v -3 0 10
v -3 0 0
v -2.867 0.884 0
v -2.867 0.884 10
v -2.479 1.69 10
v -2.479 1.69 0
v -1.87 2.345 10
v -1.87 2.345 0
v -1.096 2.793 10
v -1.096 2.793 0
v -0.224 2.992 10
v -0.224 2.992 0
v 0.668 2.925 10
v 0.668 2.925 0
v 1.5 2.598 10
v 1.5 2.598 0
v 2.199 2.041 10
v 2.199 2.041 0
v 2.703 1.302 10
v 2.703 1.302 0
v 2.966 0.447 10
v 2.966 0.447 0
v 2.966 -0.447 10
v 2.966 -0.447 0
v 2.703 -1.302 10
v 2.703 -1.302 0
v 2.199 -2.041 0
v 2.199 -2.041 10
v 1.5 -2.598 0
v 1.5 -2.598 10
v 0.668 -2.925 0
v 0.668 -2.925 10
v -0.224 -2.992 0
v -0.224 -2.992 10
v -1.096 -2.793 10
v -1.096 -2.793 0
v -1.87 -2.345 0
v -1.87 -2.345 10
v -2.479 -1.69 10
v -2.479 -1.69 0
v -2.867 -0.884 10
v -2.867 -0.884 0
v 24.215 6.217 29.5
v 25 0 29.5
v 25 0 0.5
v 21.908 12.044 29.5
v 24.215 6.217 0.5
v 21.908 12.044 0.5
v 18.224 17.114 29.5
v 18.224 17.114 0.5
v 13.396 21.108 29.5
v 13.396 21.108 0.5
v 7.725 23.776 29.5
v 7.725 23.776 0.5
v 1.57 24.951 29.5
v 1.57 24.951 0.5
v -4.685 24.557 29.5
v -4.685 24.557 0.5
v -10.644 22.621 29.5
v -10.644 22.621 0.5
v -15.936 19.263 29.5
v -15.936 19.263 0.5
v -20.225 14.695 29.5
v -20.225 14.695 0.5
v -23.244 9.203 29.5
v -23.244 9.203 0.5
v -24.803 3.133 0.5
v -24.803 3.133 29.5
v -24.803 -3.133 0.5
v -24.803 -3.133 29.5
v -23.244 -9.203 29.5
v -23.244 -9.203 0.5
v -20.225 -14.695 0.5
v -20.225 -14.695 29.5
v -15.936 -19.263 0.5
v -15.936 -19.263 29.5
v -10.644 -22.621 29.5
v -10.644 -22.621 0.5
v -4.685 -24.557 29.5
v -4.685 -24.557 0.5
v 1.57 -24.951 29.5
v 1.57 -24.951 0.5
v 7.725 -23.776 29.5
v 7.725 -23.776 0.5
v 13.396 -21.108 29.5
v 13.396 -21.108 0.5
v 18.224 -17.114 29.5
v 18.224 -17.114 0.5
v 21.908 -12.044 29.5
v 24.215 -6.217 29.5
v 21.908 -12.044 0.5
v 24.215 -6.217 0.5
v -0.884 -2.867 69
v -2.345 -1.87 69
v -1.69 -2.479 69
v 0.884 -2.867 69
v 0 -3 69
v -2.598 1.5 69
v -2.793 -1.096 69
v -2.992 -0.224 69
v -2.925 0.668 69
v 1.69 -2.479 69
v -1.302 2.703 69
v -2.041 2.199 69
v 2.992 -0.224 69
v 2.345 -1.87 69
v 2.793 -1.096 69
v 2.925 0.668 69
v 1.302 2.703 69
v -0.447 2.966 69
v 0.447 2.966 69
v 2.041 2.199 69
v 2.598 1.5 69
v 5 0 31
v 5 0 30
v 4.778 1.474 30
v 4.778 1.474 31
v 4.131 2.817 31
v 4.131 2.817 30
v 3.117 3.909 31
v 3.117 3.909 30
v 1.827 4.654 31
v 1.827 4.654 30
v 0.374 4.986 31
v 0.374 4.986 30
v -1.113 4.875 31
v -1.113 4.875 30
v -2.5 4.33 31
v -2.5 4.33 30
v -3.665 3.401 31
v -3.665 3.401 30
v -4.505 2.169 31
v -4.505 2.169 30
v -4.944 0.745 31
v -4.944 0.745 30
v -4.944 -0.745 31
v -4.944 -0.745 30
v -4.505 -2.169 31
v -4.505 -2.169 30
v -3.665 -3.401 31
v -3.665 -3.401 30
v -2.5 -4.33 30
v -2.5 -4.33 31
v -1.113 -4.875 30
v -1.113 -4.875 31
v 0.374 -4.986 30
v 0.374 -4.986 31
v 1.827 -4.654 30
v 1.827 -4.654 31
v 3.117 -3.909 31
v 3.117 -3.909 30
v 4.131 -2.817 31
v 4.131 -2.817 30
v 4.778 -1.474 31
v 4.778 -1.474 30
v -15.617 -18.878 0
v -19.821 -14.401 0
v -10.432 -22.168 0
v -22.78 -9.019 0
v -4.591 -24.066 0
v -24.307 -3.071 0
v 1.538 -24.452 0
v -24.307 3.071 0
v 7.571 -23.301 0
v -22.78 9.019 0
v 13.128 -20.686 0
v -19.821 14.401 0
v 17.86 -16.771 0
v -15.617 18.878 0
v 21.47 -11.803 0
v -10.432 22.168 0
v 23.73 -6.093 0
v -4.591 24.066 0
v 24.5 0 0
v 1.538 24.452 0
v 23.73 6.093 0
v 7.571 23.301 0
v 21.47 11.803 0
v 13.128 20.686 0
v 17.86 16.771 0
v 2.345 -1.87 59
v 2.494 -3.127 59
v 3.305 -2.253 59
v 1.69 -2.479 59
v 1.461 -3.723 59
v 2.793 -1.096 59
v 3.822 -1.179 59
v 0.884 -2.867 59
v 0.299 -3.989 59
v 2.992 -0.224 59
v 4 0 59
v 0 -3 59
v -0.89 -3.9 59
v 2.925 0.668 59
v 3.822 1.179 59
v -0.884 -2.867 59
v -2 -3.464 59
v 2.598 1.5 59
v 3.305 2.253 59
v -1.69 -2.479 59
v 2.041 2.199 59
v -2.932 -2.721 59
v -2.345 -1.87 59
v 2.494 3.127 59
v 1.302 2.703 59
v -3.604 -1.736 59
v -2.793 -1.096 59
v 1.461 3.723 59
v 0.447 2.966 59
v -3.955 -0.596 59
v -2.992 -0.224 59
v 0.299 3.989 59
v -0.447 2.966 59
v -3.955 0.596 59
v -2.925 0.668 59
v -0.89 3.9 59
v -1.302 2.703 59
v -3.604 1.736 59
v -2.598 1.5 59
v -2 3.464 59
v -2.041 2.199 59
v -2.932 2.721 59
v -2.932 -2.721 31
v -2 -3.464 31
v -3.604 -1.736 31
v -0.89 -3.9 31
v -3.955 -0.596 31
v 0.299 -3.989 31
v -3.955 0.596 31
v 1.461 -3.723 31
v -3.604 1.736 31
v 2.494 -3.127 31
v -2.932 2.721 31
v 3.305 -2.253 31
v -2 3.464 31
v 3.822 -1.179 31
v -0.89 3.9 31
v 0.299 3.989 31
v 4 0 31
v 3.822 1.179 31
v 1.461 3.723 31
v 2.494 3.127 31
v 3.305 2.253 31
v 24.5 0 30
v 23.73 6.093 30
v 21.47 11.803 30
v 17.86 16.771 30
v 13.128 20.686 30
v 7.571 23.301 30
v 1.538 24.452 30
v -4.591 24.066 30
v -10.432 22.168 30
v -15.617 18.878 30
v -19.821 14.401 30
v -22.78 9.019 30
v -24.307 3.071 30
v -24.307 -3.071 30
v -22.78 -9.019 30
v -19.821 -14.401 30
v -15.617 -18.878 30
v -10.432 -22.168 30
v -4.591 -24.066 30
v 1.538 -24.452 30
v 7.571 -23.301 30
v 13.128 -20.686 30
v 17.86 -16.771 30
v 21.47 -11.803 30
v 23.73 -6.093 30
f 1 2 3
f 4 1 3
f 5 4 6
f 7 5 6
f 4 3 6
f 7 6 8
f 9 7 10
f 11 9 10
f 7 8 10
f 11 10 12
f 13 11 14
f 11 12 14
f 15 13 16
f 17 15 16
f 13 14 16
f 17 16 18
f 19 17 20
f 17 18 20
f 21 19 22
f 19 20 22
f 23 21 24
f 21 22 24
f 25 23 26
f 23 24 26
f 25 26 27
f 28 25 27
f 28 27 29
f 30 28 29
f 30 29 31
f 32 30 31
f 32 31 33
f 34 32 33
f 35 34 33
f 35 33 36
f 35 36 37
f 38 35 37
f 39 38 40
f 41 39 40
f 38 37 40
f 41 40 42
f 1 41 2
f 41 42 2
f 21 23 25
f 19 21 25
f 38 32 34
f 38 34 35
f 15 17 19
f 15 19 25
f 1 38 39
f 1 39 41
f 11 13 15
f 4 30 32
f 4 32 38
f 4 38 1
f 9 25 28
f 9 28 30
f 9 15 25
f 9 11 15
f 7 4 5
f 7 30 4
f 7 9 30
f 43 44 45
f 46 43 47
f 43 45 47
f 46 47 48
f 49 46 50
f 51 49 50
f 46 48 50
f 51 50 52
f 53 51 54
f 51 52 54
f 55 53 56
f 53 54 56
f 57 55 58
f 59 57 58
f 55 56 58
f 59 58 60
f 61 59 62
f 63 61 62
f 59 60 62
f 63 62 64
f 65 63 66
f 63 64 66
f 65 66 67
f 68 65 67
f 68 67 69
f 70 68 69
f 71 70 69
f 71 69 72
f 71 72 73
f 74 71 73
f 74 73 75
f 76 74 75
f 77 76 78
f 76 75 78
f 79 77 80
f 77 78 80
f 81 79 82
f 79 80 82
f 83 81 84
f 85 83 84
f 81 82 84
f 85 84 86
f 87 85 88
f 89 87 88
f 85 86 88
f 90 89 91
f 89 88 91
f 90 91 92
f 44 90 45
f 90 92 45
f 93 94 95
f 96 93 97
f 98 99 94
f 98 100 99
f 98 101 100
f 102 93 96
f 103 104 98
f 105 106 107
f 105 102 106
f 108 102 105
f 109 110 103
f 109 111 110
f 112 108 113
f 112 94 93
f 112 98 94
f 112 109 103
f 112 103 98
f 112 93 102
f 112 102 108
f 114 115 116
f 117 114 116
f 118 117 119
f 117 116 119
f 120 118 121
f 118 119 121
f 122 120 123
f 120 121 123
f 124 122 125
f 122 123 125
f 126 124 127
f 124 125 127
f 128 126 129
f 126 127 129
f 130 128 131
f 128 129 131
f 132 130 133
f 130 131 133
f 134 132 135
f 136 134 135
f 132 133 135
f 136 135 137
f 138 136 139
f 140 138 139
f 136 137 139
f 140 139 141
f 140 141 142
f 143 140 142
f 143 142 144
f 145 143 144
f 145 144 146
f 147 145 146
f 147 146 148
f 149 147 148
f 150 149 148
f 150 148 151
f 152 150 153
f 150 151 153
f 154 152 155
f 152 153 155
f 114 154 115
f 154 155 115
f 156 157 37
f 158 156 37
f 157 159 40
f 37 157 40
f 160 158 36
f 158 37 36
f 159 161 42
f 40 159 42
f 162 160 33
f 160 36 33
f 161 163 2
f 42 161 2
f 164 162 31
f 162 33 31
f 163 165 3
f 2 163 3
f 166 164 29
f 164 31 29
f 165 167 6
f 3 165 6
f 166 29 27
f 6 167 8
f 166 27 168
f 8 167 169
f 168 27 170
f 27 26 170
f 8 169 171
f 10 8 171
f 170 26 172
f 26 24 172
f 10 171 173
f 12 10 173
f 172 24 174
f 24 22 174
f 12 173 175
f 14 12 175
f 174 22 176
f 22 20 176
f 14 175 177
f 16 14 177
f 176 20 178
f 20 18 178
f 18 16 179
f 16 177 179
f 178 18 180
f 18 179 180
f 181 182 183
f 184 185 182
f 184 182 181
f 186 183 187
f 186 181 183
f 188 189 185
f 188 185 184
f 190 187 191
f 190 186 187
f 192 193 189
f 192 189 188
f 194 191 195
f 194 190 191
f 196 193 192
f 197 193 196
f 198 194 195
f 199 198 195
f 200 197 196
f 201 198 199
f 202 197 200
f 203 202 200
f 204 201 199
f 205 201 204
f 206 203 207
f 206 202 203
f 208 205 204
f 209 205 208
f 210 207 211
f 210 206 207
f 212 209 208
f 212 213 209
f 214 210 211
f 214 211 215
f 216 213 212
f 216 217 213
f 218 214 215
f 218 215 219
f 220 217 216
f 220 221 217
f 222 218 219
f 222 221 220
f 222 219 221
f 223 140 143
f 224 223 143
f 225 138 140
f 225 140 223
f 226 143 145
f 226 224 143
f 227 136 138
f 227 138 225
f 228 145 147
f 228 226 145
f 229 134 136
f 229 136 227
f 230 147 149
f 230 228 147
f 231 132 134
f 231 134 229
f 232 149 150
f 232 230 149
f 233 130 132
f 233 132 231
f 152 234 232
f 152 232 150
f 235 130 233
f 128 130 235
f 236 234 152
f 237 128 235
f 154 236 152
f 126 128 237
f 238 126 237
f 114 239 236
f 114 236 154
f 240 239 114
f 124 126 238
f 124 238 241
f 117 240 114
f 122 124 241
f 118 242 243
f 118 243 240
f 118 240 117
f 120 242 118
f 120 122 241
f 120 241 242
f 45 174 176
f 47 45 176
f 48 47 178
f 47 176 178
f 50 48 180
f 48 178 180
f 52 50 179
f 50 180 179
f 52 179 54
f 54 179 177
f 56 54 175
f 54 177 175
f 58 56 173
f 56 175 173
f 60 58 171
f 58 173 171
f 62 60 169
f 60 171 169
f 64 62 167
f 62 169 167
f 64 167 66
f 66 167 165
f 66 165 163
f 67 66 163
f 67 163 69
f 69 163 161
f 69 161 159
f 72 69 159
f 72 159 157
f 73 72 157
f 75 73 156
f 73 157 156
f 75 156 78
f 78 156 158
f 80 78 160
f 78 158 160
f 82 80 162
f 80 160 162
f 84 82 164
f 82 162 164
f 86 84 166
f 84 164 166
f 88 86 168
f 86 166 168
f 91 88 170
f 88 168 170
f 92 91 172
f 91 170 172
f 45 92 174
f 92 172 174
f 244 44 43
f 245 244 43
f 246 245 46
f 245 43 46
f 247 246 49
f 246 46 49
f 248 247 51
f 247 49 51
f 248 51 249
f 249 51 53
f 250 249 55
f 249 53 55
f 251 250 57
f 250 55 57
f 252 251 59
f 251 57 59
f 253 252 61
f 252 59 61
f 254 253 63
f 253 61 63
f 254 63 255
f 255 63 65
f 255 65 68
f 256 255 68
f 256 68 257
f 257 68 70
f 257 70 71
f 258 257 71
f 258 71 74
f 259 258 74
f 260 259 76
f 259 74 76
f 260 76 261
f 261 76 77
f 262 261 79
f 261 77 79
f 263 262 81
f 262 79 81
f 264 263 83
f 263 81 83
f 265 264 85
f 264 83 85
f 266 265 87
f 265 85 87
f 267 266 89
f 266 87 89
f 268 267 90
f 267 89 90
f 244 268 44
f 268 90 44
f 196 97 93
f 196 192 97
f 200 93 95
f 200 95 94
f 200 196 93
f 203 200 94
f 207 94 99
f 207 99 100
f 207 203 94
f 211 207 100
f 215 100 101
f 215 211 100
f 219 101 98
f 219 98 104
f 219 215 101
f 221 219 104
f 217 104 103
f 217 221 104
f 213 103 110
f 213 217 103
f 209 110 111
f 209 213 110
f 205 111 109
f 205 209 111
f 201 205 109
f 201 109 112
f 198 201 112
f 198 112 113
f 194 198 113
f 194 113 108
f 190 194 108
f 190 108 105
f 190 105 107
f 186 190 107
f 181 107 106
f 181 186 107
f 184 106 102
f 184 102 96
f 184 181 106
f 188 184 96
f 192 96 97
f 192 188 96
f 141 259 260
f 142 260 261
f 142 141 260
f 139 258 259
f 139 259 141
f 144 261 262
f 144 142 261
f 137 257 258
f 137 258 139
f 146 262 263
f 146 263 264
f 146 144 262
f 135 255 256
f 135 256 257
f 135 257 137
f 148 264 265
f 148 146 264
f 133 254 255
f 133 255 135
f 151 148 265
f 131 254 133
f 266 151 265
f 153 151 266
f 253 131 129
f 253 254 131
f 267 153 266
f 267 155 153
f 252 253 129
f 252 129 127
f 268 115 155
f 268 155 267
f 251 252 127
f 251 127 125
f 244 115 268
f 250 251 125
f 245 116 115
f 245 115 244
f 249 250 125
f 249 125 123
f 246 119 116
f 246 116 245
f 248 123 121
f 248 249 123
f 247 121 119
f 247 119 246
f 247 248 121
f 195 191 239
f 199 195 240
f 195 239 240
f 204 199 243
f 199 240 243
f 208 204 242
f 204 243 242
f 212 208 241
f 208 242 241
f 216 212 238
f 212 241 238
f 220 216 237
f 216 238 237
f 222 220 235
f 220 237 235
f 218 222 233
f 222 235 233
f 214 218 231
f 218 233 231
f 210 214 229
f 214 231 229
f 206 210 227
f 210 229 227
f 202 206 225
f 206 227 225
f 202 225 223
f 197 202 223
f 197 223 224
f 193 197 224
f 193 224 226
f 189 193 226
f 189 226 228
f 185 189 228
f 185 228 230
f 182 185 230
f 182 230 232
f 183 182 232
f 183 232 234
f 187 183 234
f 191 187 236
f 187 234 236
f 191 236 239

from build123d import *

# Parameters (mm, degrees)
ESQUISSE1_R             = 25
BOSS_EXTRU_1_DEPTH      = 30
ESQUISSE2_R             = 4
BOSS_EXTRU_2_DEPTH      = 39
ESQUISSE3_R             = 5
BOSS_EXTRU_3_DEPTH      = 1
ESQUISSE4_R             = 3
ENL_V_MAT_EXTRU_1_DEPTH = 10
CHANFREIN1_SIZE         = 0.5
ESQUISSE5_W             = 10
ESQUISSE5_H             = 1


with BuildPart() as part:
    # Esquisse1 → Boss.-Extru.1 (new body)
    with BuildSketch(Plane.XY):
        Circle(ESQUISSE1_R)
    extrude(amount=BOSS_EXTRU_1_DEPTH)

    # Esquisse2 → Boss.-Extru.2 (add)
    with BuildSketch(Plane.XY.offset(30)):
        Circle(ESQUISSE2_R)
    extrude(amount=BOSS_EXTRU_2_DEPTH)

    # Esquisse3 → Boss.-Extru.3 (add)
    with BuildSketch(Plane.XY.offset(30)):
        Circle(ESQUISSE3_R)
    extrude(amount=BOSS_EXTRU_3_DEPTH)

    # Esquisse4 → Enlèv. mat.-Extru.1 (cut)
    with BuildSketch(Plane(origin=(0, 0, 0), x_dir=(-1, 0, 0), z_dir=(0, 0, -1))):
        Circle(ESQUISSE4_R)
    extrude(amount=-ENL_V_MAT_EXTRU_1_DEPTH, mode=Mode.SUBTRACT)

    # Chanfrein1
    chanfrein1_edges = [part.edges().sort_by_distance(p)[0] for p in [
        (-25, 0, 0),
        (-25, 0, 30),
        (-4, 0, 69),
    ]]
    chamfer(chanfrein1_edges, length=CHANFREIN1_SIZE)

    # Esquisse5 → Enlèvement de matière-Révolution1 (revolve, cut)
    with BuildSketch(Plane(origin=(0, 0, 0), x_dir=(0, 0, -1), z_dir=(1, 0, 0)), mode=Mode.PRIVATE) as enl_vement_de_mati_re_r_volution1_sk:
        with Locations((-64, 3.5)):
            Rectangle(ESQUISSE5_W, ESQUISSE5_H)
    revolve(enl_vement_de_mati_re_r_volution1_sk.sketch.rotate(Axis((0, 0, 69), (0, 0, -1)), 180), axis=Axis((0, 0, 69), (0, 0, -1)), mode=Mode.SUBTRACT)


solid = part.part
